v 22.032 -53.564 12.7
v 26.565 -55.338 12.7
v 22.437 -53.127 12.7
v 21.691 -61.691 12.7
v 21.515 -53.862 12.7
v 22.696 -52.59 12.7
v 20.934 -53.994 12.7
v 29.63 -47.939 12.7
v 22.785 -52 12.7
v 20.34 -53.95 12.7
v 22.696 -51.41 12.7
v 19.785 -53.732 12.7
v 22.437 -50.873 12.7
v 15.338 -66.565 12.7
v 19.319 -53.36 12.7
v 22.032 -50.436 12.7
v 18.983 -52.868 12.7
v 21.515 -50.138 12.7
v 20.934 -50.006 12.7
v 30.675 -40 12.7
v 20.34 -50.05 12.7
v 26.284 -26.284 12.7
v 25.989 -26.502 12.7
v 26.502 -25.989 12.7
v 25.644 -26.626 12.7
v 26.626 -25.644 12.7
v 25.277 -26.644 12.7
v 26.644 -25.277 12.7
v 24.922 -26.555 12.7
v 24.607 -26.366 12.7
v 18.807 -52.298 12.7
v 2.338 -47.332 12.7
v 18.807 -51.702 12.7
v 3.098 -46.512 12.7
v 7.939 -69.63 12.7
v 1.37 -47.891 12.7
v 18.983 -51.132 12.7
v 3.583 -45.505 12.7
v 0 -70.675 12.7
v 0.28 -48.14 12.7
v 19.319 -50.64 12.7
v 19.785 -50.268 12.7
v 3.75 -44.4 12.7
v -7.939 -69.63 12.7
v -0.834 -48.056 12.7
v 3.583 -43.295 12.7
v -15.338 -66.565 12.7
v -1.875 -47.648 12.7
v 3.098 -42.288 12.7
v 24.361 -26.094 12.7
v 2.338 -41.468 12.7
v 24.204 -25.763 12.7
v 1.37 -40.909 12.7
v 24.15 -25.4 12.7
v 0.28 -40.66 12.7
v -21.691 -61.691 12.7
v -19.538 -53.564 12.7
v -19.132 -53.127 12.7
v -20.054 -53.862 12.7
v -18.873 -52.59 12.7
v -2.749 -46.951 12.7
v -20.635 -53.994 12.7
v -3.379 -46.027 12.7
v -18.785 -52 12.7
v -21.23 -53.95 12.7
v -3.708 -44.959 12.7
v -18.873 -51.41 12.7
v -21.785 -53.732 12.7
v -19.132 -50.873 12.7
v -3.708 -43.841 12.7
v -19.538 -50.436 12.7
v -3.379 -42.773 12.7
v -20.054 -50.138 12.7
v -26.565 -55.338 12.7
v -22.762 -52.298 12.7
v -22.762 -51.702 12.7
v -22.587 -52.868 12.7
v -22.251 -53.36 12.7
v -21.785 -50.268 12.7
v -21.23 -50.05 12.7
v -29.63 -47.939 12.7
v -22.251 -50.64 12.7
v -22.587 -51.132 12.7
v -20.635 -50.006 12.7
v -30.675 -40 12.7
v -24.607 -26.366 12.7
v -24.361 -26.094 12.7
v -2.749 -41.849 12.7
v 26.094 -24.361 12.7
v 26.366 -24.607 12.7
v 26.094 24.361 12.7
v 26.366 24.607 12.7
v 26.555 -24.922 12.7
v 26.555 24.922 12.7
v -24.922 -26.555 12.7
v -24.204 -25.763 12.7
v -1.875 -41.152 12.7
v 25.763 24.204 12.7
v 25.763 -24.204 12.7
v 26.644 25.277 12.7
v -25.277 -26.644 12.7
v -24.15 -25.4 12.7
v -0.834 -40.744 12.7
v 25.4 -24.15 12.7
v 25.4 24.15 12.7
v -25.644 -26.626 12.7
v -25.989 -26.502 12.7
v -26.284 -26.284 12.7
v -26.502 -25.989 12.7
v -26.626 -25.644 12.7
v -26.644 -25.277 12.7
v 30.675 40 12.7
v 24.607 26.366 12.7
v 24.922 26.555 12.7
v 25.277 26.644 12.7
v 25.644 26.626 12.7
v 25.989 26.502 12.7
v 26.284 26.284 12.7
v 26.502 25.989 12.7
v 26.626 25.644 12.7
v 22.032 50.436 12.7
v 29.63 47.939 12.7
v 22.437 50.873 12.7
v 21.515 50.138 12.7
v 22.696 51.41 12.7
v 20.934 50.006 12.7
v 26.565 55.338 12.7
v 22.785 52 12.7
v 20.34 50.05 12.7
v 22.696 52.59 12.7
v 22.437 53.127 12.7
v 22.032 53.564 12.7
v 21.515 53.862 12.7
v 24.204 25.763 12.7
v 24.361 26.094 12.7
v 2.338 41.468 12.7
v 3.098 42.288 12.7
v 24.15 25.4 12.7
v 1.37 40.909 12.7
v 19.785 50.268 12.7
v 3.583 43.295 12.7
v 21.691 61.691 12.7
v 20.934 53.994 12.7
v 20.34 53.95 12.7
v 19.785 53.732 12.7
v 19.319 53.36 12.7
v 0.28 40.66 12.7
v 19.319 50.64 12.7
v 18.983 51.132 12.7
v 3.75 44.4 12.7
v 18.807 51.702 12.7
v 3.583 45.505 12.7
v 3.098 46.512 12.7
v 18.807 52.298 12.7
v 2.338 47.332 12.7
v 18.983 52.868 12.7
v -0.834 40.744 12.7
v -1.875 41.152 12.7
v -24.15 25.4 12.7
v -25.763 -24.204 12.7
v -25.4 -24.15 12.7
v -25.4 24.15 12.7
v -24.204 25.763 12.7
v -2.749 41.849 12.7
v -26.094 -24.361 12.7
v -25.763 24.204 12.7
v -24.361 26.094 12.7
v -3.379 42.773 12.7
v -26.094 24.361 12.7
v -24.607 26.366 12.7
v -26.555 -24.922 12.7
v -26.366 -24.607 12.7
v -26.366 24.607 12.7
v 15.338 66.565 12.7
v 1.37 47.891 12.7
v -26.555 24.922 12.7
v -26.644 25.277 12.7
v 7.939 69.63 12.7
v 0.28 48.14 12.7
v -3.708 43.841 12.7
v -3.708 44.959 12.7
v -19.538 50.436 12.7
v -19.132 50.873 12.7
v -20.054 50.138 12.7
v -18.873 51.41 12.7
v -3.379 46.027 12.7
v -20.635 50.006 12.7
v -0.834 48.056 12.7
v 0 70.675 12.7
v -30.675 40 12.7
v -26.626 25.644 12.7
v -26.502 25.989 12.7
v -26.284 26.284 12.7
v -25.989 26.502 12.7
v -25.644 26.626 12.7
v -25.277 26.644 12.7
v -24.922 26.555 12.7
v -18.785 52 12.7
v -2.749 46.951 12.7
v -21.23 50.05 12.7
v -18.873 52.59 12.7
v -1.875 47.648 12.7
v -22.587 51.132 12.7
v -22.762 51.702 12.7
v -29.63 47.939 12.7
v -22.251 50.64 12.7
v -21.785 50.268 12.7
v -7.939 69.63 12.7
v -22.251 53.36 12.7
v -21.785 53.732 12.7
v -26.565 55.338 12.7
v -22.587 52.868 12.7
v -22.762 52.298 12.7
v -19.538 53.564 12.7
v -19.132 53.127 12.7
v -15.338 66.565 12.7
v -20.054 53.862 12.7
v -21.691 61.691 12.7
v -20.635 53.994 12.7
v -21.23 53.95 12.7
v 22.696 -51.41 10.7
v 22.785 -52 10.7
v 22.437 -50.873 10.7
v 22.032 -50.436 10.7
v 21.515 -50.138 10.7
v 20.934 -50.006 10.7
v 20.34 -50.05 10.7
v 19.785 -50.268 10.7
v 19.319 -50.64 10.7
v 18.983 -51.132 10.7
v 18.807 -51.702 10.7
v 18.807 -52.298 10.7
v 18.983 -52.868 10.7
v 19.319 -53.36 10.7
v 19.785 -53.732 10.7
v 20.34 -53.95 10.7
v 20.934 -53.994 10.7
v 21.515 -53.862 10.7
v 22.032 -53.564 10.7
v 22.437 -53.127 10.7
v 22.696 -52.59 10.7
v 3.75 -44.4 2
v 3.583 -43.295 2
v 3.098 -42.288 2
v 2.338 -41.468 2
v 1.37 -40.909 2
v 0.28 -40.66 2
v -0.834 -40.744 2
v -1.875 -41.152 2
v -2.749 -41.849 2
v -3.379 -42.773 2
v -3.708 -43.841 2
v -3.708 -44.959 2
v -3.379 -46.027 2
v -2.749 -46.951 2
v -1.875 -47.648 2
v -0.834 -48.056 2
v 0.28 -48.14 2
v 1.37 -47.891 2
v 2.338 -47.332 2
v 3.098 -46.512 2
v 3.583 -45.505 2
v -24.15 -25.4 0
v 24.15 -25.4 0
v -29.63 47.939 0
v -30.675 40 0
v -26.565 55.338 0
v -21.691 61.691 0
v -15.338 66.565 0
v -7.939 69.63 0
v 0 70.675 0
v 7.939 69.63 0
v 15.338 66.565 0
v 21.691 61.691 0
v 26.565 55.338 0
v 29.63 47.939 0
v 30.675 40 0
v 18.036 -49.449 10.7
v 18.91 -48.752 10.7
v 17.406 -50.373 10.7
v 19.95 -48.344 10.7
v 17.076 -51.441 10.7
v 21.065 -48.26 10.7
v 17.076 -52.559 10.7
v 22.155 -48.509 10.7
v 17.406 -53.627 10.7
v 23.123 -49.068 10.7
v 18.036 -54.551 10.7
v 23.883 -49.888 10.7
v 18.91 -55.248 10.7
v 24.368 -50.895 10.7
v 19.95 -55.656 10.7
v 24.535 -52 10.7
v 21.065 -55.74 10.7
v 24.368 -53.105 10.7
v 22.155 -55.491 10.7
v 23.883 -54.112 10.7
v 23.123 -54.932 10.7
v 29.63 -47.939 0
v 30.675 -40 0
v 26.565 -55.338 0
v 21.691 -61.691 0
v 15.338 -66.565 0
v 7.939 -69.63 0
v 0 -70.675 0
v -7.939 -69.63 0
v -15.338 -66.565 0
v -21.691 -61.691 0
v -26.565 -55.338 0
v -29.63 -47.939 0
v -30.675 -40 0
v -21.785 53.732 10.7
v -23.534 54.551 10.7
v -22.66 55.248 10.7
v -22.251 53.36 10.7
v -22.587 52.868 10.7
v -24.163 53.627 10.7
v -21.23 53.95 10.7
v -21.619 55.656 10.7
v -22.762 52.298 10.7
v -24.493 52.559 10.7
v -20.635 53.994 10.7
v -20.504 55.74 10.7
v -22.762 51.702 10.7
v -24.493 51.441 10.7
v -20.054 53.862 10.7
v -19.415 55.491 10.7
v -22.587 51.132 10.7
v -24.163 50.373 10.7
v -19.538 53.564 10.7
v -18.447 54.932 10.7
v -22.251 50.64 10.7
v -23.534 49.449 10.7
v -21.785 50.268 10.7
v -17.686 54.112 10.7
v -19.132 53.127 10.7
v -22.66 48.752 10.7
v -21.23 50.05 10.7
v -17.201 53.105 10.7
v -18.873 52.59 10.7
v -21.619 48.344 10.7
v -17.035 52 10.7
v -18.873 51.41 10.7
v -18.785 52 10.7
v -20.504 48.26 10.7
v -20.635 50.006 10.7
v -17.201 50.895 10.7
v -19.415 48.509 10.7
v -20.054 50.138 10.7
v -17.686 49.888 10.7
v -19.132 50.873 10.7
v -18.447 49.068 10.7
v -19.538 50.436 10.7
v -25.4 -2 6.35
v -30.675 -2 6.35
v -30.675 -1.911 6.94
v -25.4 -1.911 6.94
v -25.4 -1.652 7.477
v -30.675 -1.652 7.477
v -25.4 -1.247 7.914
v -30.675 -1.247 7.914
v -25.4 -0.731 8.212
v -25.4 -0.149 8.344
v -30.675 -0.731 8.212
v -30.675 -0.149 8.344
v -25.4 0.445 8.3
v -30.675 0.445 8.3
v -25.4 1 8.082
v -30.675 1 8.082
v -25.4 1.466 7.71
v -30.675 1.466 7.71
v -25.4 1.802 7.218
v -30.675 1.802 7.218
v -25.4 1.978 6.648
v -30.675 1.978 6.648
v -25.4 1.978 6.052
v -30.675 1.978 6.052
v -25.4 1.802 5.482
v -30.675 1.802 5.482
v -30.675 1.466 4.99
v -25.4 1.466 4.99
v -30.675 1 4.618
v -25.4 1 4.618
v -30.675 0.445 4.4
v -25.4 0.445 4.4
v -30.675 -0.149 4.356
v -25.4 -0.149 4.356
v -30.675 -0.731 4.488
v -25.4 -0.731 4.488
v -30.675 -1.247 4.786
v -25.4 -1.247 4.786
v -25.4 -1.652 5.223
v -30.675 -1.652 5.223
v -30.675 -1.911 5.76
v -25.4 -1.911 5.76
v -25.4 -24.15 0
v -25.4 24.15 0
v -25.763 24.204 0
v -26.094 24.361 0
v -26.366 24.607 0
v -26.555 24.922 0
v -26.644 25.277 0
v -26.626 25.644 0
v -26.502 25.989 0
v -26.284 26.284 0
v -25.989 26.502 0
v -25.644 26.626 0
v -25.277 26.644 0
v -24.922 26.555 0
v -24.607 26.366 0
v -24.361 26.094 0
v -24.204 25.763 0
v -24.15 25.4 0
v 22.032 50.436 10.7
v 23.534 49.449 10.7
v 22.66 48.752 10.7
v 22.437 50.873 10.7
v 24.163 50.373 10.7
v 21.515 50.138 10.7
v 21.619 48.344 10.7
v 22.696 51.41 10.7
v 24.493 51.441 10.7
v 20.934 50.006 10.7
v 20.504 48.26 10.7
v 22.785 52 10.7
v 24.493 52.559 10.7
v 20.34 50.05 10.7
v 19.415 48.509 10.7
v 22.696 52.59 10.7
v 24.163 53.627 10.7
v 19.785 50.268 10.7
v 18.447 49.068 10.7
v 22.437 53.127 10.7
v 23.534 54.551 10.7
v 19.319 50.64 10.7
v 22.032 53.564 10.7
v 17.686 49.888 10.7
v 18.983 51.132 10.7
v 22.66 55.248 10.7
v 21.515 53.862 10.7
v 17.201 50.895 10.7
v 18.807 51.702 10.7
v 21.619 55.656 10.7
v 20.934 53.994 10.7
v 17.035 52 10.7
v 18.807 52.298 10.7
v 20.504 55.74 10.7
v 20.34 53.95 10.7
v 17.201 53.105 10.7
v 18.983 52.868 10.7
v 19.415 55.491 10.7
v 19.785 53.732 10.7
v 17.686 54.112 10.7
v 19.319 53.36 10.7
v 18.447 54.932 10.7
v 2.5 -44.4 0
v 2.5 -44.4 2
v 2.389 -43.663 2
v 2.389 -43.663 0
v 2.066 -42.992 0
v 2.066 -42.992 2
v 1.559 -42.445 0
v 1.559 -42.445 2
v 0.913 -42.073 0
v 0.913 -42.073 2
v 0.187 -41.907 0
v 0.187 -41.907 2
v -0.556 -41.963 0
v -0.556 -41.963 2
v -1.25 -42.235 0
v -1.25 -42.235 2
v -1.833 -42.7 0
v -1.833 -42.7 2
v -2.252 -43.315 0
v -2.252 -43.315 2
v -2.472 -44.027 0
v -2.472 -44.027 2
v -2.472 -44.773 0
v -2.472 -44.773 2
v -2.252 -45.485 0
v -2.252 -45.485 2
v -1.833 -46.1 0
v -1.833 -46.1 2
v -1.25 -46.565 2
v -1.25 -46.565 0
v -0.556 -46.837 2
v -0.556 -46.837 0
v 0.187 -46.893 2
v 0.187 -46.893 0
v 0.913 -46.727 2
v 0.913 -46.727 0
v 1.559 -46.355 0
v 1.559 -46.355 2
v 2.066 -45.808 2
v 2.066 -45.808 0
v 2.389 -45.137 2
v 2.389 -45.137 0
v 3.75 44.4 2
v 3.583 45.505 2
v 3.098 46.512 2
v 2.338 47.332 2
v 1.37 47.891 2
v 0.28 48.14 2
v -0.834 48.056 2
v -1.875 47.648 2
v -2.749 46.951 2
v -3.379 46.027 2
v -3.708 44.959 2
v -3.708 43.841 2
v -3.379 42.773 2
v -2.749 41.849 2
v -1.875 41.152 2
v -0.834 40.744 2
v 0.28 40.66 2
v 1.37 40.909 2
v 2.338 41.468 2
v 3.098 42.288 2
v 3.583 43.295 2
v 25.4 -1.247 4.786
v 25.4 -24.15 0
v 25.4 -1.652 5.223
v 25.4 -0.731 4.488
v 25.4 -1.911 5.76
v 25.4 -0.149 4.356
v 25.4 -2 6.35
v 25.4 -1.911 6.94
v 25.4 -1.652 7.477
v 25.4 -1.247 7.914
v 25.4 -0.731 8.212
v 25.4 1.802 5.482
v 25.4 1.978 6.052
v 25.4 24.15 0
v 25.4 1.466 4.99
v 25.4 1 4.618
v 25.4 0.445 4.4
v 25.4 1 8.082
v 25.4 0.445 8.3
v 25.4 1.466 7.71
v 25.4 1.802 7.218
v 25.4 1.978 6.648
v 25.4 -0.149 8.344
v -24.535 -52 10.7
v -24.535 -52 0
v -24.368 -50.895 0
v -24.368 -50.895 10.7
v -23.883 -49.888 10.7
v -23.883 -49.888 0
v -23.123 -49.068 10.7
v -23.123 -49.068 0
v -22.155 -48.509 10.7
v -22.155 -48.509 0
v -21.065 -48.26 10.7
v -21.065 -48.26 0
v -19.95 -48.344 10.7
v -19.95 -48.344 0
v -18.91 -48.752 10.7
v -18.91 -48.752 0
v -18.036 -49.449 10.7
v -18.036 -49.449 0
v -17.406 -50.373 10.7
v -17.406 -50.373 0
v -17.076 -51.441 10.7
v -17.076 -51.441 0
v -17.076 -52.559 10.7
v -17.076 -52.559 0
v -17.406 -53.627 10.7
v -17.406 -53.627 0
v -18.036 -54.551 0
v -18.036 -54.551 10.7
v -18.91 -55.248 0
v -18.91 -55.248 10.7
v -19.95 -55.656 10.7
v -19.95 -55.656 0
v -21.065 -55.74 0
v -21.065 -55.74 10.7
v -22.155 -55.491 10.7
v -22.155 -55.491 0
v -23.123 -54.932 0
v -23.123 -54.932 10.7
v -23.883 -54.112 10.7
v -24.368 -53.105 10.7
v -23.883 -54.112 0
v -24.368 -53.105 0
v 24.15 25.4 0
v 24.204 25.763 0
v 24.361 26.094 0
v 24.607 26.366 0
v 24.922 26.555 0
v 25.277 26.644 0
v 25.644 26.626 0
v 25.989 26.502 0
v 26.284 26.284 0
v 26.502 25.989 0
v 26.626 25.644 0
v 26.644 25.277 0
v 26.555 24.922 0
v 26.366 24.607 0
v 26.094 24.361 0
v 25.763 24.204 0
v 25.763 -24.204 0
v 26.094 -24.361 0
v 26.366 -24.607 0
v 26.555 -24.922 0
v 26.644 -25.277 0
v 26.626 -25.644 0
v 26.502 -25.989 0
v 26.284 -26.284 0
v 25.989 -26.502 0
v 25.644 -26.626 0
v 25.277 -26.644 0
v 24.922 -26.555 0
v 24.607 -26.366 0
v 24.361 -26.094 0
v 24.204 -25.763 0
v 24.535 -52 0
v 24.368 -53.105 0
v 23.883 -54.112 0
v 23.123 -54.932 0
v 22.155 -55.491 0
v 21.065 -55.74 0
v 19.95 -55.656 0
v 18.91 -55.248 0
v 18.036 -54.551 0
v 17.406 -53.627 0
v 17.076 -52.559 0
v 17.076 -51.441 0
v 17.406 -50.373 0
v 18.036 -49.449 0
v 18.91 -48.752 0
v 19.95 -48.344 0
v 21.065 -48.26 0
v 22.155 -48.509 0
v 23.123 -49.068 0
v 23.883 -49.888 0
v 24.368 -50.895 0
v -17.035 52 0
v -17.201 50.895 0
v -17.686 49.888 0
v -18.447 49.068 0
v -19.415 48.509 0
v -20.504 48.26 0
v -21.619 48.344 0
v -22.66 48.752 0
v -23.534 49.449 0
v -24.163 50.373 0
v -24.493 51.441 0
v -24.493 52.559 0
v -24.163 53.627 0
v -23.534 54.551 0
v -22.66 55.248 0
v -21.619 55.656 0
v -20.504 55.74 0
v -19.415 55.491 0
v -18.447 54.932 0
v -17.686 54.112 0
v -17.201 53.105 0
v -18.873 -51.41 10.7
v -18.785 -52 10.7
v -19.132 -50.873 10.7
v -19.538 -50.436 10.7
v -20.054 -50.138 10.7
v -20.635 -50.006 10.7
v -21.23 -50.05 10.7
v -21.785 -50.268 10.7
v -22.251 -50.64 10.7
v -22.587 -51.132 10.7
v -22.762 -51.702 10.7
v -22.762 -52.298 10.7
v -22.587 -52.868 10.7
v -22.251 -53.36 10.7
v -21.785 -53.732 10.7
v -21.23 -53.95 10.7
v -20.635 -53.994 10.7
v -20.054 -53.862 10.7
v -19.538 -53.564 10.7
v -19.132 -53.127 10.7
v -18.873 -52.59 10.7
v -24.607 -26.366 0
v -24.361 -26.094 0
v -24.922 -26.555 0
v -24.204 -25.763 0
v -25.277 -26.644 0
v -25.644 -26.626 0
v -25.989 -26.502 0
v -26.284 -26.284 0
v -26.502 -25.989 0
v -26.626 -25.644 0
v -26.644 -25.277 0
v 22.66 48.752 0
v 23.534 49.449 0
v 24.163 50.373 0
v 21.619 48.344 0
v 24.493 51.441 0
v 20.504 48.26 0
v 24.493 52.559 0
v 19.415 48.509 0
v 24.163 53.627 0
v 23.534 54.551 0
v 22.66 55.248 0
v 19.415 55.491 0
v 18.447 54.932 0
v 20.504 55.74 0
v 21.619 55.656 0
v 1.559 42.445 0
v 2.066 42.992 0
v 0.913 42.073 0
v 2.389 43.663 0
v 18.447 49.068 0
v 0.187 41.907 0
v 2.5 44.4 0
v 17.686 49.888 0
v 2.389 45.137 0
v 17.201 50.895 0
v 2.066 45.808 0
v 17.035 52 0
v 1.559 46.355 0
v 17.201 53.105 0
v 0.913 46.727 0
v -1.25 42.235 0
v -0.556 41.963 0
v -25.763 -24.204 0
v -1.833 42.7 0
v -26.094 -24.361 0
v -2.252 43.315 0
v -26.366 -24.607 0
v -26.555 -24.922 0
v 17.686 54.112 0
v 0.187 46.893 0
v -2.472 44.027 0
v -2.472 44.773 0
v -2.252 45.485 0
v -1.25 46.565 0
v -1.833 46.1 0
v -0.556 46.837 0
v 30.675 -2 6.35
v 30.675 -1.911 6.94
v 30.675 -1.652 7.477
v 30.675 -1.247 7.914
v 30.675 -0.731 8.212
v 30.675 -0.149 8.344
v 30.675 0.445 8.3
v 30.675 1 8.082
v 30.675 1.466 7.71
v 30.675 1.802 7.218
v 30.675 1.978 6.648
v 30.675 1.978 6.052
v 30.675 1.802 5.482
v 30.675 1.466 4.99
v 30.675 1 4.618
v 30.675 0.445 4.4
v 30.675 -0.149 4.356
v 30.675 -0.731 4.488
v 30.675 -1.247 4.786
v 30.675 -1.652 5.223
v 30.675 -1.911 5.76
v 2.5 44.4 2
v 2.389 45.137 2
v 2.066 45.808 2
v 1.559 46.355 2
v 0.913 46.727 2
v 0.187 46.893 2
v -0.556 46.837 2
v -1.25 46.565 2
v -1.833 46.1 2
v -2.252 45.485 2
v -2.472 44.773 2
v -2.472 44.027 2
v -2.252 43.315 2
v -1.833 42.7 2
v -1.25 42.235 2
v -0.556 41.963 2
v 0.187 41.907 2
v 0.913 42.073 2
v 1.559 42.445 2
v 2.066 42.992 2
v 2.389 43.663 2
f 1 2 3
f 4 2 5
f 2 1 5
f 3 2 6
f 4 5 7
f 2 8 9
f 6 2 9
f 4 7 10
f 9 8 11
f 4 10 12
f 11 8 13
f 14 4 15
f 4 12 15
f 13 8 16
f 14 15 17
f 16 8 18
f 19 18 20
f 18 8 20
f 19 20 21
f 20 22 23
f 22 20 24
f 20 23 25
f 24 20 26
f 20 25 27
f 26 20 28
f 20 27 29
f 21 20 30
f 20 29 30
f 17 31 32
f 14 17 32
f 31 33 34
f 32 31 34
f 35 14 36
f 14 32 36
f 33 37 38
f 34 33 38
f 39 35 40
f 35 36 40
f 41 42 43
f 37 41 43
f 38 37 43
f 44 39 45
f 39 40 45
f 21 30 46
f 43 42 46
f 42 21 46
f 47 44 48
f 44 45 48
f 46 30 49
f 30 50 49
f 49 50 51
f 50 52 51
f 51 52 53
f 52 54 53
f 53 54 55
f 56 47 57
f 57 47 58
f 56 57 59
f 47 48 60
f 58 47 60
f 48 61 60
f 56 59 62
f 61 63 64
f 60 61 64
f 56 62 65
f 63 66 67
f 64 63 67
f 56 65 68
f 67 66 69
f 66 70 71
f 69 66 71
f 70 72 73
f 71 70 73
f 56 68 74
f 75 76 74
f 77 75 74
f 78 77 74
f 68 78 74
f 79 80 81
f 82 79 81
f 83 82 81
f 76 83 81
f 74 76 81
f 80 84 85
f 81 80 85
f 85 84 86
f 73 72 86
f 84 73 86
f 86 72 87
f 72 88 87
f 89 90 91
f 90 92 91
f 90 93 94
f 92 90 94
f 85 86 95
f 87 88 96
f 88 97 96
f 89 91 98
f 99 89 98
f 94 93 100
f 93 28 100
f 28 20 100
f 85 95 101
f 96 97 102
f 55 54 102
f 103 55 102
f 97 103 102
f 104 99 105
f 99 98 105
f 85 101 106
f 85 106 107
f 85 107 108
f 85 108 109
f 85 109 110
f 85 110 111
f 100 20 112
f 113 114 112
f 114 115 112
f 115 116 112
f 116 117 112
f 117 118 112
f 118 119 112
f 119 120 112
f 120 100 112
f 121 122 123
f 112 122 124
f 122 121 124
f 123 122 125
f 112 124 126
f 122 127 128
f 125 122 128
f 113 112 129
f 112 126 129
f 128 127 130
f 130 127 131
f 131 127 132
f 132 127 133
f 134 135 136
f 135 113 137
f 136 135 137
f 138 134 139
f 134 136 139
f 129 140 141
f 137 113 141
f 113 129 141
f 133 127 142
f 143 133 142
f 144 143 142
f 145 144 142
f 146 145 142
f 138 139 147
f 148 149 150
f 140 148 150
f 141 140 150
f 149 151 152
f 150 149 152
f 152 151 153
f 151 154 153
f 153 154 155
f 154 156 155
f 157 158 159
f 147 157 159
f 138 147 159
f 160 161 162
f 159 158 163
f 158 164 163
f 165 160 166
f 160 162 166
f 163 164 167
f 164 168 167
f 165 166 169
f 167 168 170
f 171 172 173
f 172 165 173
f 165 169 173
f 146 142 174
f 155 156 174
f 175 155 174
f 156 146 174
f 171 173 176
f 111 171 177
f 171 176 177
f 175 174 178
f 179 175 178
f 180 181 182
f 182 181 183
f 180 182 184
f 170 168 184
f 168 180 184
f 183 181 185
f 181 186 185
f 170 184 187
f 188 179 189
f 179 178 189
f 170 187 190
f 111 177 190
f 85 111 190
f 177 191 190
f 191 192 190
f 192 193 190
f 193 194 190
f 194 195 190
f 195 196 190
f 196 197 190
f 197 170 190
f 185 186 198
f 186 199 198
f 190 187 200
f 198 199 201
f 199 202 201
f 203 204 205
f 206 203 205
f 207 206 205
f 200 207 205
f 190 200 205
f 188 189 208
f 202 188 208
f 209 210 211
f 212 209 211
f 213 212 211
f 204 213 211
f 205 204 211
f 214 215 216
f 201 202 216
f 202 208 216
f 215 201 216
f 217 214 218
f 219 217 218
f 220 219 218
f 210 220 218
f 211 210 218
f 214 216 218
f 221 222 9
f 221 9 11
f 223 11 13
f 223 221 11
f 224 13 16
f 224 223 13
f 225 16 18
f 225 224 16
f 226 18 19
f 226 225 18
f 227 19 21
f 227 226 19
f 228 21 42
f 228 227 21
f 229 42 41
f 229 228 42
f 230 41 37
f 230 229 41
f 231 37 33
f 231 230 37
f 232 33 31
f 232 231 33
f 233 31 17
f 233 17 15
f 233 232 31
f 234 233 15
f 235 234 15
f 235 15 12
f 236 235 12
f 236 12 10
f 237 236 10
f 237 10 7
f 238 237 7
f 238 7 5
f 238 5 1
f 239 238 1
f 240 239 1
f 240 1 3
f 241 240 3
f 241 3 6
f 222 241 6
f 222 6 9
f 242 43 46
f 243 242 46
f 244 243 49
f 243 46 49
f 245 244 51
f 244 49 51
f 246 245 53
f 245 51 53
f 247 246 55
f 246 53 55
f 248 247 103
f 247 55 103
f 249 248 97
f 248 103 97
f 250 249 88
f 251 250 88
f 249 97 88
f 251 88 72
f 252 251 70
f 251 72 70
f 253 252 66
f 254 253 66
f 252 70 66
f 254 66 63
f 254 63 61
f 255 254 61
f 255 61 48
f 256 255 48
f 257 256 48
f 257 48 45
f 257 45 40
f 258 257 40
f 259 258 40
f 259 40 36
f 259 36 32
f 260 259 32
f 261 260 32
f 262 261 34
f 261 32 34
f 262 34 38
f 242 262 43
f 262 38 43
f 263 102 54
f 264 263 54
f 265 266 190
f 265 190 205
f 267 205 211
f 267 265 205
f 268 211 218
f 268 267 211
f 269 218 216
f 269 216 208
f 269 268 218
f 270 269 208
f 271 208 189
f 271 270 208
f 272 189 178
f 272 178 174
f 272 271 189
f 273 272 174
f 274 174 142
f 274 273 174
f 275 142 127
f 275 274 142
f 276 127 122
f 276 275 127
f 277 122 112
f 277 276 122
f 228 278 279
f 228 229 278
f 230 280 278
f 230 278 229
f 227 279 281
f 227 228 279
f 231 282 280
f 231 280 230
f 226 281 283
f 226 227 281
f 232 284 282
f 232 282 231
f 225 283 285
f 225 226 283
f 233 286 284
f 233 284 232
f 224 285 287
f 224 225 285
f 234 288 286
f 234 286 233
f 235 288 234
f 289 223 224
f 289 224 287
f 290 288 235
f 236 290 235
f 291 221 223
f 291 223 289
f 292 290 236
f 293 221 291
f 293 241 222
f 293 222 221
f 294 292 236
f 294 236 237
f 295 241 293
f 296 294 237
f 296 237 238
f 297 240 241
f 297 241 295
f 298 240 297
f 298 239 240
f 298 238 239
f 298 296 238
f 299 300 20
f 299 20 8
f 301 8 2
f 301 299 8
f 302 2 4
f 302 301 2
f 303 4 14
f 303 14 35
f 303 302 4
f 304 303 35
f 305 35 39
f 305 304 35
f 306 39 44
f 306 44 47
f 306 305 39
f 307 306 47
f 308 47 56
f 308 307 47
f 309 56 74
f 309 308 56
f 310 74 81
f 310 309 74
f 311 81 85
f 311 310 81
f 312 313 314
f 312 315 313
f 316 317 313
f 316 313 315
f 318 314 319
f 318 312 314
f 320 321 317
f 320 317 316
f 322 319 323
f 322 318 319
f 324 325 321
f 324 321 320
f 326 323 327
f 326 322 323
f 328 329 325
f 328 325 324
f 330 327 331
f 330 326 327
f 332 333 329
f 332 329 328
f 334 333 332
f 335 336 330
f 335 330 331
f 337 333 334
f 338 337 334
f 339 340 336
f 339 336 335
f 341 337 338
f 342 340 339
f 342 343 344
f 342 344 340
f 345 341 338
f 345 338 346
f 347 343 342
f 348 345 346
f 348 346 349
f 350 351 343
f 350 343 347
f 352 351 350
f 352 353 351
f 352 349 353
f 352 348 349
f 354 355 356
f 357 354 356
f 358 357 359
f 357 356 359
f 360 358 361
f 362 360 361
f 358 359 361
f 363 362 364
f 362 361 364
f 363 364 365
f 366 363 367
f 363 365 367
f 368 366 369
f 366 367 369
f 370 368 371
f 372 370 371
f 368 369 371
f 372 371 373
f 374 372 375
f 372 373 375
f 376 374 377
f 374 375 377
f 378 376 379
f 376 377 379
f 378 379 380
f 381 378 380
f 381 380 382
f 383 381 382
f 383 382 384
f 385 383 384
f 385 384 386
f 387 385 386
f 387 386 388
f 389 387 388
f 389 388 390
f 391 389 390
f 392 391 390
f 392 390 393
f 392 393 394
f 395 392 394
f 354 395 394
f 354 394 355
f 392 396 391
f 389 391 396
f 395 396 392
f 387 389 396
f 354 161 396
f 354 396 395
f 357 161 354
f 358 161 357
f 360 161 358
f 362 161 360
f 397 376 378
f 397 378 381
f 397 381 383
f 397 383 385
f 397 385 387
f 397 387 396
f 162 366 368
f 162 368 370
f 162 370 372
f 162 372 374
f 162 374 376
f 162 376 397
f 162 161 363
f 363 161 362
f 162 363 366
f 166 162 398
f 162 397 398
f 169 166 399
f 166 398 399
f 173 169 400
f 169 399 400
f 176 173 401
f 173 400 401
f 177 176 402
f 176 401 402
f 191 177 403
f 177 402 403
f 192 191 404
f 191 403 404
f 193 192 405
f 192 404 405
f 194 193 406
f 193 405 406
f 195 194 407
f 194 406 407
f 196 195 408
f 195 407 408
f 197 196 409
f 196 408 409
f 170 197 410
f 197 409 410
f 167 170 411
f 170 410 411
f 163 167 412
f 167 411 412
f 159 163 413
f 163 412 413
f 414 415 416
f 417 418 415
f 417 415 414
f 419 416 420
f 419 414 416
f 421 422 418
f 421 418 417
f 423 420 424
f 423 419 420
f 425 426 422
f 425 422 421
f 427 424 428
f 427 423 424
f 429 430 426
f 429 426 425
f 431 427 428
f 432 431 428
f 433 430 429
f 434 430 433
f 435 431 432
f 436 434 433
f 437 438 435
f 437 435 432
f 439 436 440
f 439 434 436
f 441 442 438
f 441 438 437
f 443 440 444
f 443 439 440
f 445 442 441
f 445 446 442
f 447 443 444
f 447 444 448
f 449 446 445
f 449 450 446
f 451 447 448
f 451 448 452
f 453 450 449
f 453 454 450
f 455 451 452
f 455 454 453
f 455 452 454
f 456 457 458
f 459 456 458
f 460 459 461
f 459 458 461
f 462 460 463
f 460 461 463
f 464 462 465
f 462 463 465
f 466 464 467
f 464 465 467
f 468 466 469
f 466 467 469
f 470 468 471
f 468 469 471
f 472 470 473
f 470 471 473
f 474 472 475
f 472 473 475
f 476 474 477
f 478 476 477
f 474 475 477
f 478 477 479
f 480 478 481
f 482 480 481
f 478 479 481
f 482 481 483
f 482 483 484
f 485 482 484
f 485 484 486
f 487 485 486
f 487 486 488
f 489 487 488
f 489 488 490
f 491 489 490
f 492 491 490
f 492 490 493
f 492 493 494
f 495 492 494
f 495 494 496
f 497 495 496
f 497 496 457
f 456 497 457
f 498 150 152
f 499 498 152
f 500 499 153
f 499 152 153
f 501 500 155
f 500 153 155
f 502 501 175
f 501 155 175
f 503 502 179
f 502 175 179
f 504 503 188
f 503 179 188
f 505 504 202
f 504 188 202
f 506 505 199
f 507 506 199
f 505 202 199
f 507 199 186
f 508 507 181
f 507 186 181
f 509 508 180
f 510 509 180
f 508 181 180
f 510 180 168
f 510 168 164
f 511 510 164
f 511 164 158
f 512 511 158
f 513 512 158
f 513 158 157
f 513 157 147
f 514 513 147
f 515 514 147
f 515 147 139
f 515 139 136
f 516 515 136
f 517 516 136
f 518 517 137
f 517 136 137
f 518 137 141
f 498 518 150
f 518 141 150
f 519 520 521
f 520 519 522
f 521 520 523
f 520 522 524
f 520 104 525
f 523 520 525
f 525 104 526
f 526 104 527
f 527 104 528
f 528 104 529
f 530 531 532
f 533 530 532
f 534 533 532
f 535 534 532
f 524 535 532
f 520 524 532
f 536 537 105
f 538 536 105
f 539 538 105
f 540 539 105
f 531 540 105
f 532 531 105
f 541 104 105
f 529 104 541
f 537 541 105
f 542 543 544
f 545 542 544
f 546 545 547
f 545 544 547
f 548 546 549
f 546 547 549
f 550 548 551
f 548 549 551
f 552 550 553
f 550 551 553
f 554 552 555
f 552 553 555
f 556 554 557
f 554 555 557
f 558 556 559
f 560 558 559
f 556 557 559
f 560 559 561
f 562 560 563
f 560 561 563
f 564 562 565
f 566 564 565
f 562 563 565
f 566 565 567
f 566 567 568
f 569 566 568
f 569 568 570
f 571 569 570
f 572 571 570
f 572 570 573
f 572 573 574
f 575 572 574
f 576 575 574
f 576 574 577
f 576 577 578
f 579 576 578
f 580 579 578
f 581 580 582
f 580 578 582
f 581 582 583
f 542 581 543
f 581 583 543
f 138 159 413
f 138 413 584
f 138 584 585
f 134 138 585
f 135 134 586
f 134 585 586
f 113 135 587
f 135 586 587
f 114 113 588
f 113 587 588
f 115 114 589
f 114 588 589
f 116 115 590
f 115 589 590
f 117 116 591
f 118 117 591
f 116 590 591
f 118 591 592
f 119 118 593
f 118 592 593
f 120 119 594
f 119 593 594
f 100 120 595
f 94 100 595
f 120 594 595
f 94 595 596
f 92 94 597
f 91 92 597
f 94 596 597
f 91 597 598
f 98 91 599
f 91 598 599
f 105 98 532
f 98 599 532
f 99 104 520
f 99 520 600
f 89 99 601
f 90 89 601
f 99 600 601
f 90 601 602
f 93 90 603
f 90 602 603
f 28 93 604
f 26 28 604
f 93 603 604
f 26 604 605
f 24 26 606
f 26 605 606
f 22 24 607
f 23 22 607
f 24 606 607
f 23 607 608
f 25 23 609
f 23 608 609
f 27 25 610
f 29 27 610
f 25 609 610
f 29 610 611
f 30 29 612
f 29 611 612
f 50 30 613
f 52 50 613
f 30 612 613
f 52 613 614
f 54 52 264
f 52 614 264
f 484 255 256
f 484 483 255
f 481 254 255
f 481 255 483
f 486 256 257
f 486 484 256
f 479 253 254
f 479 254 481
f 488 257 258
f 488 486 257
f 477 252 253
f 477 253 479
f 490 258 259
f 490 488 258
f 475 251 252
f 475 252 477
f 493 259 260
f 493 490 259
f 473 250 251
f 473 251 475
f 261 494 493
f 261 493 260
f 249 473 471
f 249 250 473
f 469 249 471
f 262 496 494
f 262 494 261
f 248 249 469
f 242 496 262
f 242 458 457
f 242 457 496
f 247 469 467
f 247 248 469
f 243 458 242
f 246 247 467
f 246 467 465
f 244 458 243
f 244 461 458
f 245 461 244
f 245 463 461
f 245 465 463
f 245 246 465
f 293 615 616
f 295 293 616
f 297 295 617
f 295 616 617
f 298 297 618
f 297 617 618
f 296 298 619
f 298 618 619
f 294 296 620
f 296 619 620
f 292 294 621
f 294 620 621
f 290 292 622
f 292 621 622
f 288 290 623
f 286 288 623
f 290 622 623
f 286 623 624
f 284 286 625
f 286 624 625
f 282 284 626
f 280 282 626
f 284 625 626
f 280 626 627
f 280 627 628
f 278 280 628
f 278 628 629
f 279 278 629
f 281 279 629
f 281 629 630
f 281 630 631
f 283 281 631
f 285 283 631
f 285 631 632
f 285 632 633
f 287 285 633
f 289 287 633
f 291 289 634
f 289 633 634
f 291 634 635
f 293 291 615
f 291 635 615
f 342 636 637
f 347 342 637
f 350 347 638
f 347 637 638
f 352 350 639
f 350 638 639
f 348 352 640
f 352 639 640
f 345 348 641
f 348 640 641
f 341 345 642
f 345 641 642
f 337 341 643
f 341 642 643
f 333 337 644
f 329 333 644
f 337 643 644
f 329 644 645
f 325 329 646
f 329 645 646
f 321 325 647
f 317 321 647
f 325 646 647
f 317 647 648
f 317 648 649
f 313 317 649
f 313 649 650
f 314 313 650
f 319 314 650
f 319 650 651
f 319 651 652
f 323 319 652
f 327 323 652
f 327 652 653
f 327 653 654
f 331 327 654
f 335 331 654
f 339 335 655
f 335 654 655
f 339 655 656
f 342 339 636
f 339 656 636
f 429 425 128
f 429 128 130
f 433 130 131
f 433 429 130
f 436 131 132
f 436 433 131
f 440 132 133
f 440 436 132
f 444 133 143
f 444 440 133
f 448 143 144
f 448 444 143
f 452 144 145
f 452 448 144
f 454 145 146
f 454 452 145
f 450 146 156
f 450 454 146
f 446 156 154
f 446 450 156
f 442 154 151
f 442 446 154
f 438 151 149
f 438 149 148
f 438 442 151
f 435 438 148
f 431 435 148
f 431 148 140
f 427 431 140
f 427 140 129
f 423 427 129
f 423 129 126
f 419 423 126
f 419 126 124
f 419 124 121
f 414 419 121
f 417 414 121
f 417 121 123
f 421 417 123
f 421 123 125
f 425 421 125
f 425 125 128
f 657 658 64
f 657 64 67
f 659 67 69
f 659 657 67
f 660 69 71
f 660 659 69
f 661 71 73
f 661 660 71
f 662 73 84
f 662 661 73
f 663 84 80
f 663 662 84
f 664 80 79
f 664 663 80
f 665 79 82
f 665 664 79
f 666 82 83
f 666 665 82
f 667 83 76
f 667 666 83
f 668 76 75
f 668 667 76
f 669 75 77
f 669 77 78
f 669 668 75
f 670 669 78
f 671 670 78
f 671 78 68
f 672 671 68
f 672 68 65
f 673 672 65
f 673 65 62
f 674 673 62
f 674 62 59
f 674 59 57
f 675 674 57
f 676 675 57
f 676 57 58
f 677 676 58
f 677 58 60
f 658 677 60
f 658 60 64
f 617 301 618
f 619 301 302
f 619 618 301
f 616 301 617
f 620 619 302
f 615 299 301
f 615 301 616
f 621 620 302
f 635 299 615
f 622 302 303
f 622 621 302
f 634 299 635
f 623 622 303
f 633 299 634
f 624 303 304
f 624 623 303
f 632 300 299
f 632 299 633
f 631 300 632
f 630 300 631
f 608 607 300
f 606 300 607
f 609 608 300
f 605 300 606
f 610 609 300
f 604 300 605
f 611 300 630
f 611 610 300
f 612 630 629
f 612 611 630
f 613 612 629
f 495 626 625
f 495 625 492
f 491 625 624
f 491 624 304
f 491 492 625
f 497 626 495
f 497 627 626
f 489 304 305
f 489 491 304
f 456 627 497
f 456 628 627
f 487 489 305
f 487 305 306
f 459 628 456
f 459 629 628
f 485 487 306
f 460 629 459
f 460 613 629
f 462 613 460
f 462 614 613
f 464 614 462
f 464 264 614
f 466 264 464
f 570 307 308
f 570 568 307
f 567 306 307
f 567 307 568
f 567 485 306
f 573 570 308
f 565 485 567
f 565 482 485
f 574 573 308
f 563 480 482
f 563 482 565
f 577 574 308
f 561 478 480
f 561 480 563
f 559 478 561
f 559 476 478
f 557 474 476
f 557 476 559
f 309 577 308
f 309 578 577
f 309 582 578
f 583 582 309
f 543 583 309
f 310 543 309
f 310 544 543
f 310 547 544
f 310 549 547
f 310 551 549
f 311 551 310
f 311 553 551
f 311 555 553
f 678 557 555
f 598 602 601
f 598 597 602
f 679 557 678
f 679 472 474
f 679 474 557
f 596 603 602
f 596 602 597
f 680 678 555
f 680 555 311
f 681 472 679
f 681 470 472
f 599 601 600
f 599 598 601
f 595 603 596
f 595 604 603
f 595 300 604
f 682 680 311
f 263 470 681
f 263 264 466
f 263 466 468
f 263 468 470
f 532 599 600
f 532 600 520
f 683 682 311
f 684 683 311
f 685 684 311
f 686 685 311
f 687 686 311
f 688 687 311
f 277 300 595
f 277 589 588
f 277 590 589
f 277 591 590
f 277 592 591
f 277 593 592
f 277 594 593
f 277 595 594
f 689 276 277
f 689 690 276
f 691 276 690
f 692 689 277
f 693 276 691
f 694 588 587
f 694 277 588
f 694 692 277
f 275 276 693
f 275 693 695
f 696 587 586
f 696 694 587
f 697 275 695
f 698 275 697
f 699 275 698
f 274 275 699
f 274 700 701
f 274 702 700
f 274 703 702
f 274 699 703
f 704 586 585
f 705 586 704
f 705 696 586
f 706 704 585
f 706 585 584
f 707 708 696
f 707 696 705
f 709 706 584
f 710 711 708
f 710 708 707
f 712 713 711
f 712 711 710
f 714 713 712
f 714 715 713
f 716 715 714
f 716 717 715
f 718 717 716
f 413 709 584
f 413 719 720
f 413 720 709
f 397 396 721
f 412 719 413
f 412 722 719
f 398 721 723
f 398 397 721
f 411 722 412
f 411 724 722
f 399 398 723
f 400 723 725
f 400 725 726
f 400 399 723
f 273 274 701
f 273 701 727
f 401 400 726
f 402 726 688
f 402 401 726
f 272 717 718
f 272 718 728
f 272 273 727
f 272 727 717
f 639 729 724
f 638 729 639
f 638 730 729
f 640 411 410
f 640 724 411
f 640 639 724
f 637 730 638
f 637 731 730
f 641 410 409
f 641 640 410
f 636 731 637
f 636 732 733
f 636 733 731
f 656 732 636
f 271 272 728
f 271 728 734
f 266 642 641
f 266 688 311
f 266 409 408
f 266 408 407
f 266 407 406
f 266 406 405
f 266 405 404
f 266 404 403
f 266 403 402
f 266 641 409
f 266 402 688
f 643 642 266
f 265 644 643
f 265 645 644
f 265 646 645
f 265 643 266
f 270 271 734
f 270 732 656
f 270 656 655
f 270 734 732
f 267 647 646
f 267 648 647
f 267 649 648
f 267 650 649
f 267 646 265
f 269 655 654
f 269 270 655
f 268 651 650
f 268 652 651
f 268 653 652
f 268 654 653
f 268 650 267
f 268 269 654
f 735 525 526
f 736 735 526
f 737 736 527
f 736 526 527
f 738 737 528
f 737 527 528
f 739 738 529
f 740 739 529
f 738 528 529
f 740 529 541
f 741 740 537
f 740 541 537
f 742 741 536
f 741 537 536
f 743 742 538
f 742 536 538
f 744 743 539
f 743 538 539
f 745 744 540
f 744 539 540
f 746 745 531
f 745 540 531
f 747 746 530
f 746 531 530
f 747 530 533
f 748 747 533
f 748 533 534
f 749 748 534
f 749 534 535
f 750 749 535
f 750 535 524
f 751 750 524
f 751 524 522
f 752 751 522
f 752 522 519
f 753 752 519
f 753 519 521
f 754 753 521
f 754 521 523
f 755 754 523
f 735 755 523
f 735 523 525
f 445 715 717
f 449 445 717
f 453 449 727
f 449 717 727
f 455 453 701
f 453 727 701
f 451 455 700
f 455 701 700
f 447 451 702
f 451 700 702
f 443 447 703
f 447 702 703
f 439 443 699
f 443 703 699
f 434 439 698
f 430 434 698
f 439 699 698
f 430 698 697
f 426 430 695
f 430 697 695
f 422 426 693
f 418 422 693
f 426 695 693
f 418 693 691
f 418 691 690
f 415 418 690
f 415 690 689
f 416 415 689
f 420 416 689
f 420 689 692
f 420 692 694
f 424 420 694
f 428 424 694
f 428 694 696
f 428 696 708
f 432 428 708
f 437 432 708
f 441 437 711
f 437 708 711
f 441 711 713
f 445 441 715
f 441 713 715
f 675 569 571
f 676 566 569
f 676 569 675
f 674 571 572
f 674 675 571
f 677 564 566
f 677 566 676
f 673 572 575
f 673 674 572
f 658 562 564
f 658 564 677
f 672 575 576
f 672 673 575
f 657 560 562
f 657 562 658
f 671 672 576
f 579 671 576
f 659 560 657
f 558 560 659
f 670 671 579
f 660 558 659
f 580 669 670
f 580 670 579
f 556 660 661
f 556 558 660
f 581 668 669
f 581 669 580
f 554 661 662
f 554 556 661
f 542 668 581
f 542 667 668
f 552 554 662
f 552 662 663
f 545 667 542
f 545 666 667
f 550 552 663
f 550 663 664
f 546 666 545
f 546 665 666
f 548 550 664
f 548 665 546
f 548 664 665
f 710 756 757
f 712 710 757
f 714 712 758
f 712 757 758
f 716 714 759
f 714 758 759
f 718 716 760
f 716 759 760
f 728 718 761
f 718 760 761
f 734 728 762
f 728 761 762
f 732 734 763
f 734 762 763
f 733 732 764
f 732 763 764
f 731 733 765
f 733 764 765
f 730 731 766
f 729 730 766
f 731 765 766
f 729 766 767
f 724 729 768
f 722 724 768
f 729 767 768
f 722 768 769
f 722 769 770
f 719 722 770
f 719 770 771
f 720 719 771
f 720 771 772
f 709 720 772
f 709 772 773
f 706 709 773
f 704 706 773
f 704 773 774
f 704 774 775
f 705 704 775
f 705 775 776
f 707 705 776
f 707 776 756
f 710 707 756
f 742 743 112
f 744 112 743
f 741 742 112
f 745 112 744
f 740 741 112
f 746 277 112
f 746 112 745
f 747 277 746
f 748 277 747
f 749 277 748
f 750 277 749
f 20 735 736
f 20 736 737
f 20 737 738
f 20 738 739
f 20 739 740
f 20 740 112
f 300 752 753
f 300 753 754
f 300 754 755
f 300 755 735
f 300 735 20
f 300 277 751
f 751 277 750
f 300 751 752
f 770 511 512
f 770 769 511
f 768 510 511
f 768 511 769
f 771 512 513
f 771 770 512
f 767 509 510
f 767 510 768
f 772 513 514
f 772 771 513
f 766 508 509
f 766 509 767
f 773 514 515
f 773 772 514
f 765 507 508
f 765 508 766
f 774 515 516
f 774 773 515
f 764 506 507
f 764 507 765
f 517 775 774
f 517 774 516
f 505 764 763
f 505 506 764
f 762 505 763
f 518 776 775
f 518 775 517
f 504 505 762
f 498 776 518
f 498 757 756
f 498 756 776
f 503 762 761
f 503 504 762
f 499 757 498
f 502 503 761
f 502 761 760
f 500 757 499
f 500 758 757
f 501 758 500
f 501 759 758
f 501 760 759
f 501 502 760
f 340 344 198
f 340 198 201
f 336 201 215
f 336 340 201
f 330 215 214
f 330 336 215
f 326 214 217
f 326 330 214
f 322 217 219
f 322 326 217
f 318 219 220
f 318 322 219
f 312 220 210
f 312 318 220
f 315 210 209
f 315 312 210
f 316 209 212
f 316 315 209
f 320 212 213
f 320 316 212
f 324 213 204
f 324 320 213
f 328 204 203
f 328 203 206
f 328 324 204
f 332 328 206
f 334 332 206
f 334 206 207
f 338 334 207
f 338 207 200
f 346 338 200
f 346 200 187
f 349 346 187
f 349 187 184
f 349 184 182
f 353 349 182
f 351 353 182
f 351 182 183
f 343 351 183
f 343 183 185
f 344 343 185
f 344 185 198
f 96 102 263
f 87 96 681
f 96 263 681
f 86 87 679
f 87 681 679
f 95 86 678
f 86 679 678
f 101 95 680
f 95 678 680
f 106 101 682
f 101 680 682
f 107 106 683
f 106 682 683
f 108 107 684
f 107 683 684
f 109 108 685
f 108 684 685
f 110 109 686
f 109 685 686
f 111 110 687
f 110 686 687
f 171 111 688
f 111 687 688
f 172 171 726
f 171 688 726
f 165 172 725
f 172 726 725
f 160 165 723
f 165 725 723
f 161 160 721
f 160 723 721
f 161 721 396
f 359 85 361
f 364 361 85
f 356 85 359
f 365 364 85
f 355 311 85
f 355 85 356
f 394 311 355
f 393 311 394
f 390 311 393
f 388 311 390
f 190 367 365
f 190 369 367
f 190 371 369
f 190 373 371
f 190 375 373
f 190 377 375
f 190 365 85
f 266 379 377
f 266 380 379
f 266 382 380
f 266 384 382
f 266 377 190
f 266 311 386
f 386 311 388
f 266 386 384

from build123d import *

# Parameters (mm, degrees)
SKETCH1_R           = 27.5
BOSS_EXTRUDE1_DEPTH = 12.7
BOSS_EXTRUDE2_START = -12.7
SKETCH2_R           = 2
BOSS_EXTRUDE2_DEPTH = 12.7
SKETCH7_R           = 2
CUT_EXTRUDE4_DEPTH  = 85
SKETCH8_R           = 2.5
SKETCH8_W           = 50.8
SKETCH8_H           = 50.8
CUT_EXTRUDE5_DEPTH  = 12.7
SKETCH9_R           = 1.25
CUT_EXTRUDE6_DEPTH  = 12.7
SKETCH10_R          = 3.75
CUT_EXTRUDE7_DEPTH  = 10.7
SKETCH11_R          = 3.75
CUT_EXTRUDE8_DEPTH  = 10.7


with BuildPart() as part:
    # Sketch1 → Boss-Extrude1 (new body)
    with BuildSketch(Plane.XY):
        with BuildLine():
            Line((30.675000233, 40), (30.675000233, -40))
            ThreePointArc((30.675000233, -40), (0, -70.675000233), (-30.675000233, -40))
            Line((-30.675000233, -40), (-30.675000233, 40))
            ThreePointArc((-30.675000233, 40), (0, 70.675000233), (30.675000233, 40))
        make_face()
        with Locations((0, -40)):
            Circle(SKETCH1_R, mode=Mode.SUBTRACT)
        with Locations(Location((0, 40, 0), (0, 0, 180))):
            Circle(SKETCH1_R, mode=Mode.SUBTRACT)
    extrude(amount=BOSS_EXTRUDE1_DEPTH)

    # Sketch2 → Boss-Extrude2 (add)
    with BuildSketch(Plane.XY.offset(12.7).offset(BOSS_EXTRUDE2_START)):
        with BuildLine():
            Line((-30.675000233, 40), (-30.675000233, -40))
            ThreePointArc((-30.675000233, -40), (0, -70.675000233), (30.675000233, -40))
            Line((30.675000233, -40), (30.675000233, 40))
            ThreePointArc((30.675000233, 40), (0, 70.675000233), (-30.675000233, 40))
        make_face()
        with Locations((20.784609691, 52)):
            Circle(SKETCH2_R, mode=Mode.SUBTRACT)
        with Locations((-20.784609691, 52)):
            Circle(SKETCH2_R, mode=Mode.SUBTRACT)
        with Locations((-20.784609691, -52)):
            Circle(SKETCH2_R, mode=Mode.SUBTRACT)
        with Locations((20.784609691, -52)):
            Circle(SKETCH2_R, mode=Mode.SUBTRACT)
    extrude(amount=BOSS_EXTRUDE2_DEPTH)

    # Sketch7 → Cut-Extrude4 (cut)
    with BuildSketch(Plane.ZY.offset(30.675000233)):
        with Locations(Location((6.35, 0, 0), (0, 0, 270))):
            Circle(SKETCH7_R)
    extrude(amount=-CUT_EXTRUDE4_DEPTH, mode=Mode.SUBTRACT)

    # Sketch8 → Cut-Extrude5 (cut)
    with BuildSketch(Plane.XY.offset(12.7)):
        with Locations((0, 44.4)):
            Circle(SKETCH8_R)
        with Locations((0, -44.4)):
            Circle(SKETCH8_R)
        Rectangle(SKETCH8_W, SKETCH8_H)
    extrude(amount=-CUT_EXTRUDE5_DEPTH, mode=Mode.SUBTRACT)

    # Sketch9 → Cut-Extrude6 (cut)
    with BuildSketch(Plane(origin=(0, 0, 0), x_dir=(-1, 0, 0), z_dir=(0, 0, -1))):
        with Locations((-25.4, 25.4)):
            Circle(SKETCH9_R)
        with Locations((25.4, 25.4)):
            Circle(SKETCH9_R)
        with Locations((25.4, -25.4)):
            Circle(SKETCH9_R)
        with Locations((-25.4, -25.4)):
            Circle(SKETCH9_R)
    extrude(amount=-CUT_EXTRUDE6_DEPTH, mode=Mode.SUBTRACT)

    # Sketch10 → Cut-Extrude7 (cut)
    with BuildSketch(Plane(origin=(0, 0, 0), x_dir=(-1, 0, 0), z_dir=(0, 0, -1))):
        with Locations((-20.784609691, 52)):
            Circle(SKETCH10_R)
        with Locations(Location((20.784609691, 52, 0), (0, 0, 180))):
            Circle(SKETCH10_R)
        with Locations((20.784609691, -52)):
            Circle(SKETCH10_R)
        with Locations(Location((-20.784609691, -52, 0), (0, 0, 180))):
            Circle(SKETCH10_R)
    extrude(amount=-CUT_EXTRUDE7_DEPTH, mode=Mode.SUBTRACT)

    # Sketch11 → Cut-Extrude8 (cut)
    with BuildSketch(Plane.XY.offset(12.7)):
        with Locations((0, 44.4)):
            Circle(SKETCH11_R)
        with Locations((0, -44.4)):
            Circle(SKETCH11_R)
    extrude(amount=-CUT_EXTRUDE8_DEPTH, mode=Mode.SUBTRACT)


solid = part.part
